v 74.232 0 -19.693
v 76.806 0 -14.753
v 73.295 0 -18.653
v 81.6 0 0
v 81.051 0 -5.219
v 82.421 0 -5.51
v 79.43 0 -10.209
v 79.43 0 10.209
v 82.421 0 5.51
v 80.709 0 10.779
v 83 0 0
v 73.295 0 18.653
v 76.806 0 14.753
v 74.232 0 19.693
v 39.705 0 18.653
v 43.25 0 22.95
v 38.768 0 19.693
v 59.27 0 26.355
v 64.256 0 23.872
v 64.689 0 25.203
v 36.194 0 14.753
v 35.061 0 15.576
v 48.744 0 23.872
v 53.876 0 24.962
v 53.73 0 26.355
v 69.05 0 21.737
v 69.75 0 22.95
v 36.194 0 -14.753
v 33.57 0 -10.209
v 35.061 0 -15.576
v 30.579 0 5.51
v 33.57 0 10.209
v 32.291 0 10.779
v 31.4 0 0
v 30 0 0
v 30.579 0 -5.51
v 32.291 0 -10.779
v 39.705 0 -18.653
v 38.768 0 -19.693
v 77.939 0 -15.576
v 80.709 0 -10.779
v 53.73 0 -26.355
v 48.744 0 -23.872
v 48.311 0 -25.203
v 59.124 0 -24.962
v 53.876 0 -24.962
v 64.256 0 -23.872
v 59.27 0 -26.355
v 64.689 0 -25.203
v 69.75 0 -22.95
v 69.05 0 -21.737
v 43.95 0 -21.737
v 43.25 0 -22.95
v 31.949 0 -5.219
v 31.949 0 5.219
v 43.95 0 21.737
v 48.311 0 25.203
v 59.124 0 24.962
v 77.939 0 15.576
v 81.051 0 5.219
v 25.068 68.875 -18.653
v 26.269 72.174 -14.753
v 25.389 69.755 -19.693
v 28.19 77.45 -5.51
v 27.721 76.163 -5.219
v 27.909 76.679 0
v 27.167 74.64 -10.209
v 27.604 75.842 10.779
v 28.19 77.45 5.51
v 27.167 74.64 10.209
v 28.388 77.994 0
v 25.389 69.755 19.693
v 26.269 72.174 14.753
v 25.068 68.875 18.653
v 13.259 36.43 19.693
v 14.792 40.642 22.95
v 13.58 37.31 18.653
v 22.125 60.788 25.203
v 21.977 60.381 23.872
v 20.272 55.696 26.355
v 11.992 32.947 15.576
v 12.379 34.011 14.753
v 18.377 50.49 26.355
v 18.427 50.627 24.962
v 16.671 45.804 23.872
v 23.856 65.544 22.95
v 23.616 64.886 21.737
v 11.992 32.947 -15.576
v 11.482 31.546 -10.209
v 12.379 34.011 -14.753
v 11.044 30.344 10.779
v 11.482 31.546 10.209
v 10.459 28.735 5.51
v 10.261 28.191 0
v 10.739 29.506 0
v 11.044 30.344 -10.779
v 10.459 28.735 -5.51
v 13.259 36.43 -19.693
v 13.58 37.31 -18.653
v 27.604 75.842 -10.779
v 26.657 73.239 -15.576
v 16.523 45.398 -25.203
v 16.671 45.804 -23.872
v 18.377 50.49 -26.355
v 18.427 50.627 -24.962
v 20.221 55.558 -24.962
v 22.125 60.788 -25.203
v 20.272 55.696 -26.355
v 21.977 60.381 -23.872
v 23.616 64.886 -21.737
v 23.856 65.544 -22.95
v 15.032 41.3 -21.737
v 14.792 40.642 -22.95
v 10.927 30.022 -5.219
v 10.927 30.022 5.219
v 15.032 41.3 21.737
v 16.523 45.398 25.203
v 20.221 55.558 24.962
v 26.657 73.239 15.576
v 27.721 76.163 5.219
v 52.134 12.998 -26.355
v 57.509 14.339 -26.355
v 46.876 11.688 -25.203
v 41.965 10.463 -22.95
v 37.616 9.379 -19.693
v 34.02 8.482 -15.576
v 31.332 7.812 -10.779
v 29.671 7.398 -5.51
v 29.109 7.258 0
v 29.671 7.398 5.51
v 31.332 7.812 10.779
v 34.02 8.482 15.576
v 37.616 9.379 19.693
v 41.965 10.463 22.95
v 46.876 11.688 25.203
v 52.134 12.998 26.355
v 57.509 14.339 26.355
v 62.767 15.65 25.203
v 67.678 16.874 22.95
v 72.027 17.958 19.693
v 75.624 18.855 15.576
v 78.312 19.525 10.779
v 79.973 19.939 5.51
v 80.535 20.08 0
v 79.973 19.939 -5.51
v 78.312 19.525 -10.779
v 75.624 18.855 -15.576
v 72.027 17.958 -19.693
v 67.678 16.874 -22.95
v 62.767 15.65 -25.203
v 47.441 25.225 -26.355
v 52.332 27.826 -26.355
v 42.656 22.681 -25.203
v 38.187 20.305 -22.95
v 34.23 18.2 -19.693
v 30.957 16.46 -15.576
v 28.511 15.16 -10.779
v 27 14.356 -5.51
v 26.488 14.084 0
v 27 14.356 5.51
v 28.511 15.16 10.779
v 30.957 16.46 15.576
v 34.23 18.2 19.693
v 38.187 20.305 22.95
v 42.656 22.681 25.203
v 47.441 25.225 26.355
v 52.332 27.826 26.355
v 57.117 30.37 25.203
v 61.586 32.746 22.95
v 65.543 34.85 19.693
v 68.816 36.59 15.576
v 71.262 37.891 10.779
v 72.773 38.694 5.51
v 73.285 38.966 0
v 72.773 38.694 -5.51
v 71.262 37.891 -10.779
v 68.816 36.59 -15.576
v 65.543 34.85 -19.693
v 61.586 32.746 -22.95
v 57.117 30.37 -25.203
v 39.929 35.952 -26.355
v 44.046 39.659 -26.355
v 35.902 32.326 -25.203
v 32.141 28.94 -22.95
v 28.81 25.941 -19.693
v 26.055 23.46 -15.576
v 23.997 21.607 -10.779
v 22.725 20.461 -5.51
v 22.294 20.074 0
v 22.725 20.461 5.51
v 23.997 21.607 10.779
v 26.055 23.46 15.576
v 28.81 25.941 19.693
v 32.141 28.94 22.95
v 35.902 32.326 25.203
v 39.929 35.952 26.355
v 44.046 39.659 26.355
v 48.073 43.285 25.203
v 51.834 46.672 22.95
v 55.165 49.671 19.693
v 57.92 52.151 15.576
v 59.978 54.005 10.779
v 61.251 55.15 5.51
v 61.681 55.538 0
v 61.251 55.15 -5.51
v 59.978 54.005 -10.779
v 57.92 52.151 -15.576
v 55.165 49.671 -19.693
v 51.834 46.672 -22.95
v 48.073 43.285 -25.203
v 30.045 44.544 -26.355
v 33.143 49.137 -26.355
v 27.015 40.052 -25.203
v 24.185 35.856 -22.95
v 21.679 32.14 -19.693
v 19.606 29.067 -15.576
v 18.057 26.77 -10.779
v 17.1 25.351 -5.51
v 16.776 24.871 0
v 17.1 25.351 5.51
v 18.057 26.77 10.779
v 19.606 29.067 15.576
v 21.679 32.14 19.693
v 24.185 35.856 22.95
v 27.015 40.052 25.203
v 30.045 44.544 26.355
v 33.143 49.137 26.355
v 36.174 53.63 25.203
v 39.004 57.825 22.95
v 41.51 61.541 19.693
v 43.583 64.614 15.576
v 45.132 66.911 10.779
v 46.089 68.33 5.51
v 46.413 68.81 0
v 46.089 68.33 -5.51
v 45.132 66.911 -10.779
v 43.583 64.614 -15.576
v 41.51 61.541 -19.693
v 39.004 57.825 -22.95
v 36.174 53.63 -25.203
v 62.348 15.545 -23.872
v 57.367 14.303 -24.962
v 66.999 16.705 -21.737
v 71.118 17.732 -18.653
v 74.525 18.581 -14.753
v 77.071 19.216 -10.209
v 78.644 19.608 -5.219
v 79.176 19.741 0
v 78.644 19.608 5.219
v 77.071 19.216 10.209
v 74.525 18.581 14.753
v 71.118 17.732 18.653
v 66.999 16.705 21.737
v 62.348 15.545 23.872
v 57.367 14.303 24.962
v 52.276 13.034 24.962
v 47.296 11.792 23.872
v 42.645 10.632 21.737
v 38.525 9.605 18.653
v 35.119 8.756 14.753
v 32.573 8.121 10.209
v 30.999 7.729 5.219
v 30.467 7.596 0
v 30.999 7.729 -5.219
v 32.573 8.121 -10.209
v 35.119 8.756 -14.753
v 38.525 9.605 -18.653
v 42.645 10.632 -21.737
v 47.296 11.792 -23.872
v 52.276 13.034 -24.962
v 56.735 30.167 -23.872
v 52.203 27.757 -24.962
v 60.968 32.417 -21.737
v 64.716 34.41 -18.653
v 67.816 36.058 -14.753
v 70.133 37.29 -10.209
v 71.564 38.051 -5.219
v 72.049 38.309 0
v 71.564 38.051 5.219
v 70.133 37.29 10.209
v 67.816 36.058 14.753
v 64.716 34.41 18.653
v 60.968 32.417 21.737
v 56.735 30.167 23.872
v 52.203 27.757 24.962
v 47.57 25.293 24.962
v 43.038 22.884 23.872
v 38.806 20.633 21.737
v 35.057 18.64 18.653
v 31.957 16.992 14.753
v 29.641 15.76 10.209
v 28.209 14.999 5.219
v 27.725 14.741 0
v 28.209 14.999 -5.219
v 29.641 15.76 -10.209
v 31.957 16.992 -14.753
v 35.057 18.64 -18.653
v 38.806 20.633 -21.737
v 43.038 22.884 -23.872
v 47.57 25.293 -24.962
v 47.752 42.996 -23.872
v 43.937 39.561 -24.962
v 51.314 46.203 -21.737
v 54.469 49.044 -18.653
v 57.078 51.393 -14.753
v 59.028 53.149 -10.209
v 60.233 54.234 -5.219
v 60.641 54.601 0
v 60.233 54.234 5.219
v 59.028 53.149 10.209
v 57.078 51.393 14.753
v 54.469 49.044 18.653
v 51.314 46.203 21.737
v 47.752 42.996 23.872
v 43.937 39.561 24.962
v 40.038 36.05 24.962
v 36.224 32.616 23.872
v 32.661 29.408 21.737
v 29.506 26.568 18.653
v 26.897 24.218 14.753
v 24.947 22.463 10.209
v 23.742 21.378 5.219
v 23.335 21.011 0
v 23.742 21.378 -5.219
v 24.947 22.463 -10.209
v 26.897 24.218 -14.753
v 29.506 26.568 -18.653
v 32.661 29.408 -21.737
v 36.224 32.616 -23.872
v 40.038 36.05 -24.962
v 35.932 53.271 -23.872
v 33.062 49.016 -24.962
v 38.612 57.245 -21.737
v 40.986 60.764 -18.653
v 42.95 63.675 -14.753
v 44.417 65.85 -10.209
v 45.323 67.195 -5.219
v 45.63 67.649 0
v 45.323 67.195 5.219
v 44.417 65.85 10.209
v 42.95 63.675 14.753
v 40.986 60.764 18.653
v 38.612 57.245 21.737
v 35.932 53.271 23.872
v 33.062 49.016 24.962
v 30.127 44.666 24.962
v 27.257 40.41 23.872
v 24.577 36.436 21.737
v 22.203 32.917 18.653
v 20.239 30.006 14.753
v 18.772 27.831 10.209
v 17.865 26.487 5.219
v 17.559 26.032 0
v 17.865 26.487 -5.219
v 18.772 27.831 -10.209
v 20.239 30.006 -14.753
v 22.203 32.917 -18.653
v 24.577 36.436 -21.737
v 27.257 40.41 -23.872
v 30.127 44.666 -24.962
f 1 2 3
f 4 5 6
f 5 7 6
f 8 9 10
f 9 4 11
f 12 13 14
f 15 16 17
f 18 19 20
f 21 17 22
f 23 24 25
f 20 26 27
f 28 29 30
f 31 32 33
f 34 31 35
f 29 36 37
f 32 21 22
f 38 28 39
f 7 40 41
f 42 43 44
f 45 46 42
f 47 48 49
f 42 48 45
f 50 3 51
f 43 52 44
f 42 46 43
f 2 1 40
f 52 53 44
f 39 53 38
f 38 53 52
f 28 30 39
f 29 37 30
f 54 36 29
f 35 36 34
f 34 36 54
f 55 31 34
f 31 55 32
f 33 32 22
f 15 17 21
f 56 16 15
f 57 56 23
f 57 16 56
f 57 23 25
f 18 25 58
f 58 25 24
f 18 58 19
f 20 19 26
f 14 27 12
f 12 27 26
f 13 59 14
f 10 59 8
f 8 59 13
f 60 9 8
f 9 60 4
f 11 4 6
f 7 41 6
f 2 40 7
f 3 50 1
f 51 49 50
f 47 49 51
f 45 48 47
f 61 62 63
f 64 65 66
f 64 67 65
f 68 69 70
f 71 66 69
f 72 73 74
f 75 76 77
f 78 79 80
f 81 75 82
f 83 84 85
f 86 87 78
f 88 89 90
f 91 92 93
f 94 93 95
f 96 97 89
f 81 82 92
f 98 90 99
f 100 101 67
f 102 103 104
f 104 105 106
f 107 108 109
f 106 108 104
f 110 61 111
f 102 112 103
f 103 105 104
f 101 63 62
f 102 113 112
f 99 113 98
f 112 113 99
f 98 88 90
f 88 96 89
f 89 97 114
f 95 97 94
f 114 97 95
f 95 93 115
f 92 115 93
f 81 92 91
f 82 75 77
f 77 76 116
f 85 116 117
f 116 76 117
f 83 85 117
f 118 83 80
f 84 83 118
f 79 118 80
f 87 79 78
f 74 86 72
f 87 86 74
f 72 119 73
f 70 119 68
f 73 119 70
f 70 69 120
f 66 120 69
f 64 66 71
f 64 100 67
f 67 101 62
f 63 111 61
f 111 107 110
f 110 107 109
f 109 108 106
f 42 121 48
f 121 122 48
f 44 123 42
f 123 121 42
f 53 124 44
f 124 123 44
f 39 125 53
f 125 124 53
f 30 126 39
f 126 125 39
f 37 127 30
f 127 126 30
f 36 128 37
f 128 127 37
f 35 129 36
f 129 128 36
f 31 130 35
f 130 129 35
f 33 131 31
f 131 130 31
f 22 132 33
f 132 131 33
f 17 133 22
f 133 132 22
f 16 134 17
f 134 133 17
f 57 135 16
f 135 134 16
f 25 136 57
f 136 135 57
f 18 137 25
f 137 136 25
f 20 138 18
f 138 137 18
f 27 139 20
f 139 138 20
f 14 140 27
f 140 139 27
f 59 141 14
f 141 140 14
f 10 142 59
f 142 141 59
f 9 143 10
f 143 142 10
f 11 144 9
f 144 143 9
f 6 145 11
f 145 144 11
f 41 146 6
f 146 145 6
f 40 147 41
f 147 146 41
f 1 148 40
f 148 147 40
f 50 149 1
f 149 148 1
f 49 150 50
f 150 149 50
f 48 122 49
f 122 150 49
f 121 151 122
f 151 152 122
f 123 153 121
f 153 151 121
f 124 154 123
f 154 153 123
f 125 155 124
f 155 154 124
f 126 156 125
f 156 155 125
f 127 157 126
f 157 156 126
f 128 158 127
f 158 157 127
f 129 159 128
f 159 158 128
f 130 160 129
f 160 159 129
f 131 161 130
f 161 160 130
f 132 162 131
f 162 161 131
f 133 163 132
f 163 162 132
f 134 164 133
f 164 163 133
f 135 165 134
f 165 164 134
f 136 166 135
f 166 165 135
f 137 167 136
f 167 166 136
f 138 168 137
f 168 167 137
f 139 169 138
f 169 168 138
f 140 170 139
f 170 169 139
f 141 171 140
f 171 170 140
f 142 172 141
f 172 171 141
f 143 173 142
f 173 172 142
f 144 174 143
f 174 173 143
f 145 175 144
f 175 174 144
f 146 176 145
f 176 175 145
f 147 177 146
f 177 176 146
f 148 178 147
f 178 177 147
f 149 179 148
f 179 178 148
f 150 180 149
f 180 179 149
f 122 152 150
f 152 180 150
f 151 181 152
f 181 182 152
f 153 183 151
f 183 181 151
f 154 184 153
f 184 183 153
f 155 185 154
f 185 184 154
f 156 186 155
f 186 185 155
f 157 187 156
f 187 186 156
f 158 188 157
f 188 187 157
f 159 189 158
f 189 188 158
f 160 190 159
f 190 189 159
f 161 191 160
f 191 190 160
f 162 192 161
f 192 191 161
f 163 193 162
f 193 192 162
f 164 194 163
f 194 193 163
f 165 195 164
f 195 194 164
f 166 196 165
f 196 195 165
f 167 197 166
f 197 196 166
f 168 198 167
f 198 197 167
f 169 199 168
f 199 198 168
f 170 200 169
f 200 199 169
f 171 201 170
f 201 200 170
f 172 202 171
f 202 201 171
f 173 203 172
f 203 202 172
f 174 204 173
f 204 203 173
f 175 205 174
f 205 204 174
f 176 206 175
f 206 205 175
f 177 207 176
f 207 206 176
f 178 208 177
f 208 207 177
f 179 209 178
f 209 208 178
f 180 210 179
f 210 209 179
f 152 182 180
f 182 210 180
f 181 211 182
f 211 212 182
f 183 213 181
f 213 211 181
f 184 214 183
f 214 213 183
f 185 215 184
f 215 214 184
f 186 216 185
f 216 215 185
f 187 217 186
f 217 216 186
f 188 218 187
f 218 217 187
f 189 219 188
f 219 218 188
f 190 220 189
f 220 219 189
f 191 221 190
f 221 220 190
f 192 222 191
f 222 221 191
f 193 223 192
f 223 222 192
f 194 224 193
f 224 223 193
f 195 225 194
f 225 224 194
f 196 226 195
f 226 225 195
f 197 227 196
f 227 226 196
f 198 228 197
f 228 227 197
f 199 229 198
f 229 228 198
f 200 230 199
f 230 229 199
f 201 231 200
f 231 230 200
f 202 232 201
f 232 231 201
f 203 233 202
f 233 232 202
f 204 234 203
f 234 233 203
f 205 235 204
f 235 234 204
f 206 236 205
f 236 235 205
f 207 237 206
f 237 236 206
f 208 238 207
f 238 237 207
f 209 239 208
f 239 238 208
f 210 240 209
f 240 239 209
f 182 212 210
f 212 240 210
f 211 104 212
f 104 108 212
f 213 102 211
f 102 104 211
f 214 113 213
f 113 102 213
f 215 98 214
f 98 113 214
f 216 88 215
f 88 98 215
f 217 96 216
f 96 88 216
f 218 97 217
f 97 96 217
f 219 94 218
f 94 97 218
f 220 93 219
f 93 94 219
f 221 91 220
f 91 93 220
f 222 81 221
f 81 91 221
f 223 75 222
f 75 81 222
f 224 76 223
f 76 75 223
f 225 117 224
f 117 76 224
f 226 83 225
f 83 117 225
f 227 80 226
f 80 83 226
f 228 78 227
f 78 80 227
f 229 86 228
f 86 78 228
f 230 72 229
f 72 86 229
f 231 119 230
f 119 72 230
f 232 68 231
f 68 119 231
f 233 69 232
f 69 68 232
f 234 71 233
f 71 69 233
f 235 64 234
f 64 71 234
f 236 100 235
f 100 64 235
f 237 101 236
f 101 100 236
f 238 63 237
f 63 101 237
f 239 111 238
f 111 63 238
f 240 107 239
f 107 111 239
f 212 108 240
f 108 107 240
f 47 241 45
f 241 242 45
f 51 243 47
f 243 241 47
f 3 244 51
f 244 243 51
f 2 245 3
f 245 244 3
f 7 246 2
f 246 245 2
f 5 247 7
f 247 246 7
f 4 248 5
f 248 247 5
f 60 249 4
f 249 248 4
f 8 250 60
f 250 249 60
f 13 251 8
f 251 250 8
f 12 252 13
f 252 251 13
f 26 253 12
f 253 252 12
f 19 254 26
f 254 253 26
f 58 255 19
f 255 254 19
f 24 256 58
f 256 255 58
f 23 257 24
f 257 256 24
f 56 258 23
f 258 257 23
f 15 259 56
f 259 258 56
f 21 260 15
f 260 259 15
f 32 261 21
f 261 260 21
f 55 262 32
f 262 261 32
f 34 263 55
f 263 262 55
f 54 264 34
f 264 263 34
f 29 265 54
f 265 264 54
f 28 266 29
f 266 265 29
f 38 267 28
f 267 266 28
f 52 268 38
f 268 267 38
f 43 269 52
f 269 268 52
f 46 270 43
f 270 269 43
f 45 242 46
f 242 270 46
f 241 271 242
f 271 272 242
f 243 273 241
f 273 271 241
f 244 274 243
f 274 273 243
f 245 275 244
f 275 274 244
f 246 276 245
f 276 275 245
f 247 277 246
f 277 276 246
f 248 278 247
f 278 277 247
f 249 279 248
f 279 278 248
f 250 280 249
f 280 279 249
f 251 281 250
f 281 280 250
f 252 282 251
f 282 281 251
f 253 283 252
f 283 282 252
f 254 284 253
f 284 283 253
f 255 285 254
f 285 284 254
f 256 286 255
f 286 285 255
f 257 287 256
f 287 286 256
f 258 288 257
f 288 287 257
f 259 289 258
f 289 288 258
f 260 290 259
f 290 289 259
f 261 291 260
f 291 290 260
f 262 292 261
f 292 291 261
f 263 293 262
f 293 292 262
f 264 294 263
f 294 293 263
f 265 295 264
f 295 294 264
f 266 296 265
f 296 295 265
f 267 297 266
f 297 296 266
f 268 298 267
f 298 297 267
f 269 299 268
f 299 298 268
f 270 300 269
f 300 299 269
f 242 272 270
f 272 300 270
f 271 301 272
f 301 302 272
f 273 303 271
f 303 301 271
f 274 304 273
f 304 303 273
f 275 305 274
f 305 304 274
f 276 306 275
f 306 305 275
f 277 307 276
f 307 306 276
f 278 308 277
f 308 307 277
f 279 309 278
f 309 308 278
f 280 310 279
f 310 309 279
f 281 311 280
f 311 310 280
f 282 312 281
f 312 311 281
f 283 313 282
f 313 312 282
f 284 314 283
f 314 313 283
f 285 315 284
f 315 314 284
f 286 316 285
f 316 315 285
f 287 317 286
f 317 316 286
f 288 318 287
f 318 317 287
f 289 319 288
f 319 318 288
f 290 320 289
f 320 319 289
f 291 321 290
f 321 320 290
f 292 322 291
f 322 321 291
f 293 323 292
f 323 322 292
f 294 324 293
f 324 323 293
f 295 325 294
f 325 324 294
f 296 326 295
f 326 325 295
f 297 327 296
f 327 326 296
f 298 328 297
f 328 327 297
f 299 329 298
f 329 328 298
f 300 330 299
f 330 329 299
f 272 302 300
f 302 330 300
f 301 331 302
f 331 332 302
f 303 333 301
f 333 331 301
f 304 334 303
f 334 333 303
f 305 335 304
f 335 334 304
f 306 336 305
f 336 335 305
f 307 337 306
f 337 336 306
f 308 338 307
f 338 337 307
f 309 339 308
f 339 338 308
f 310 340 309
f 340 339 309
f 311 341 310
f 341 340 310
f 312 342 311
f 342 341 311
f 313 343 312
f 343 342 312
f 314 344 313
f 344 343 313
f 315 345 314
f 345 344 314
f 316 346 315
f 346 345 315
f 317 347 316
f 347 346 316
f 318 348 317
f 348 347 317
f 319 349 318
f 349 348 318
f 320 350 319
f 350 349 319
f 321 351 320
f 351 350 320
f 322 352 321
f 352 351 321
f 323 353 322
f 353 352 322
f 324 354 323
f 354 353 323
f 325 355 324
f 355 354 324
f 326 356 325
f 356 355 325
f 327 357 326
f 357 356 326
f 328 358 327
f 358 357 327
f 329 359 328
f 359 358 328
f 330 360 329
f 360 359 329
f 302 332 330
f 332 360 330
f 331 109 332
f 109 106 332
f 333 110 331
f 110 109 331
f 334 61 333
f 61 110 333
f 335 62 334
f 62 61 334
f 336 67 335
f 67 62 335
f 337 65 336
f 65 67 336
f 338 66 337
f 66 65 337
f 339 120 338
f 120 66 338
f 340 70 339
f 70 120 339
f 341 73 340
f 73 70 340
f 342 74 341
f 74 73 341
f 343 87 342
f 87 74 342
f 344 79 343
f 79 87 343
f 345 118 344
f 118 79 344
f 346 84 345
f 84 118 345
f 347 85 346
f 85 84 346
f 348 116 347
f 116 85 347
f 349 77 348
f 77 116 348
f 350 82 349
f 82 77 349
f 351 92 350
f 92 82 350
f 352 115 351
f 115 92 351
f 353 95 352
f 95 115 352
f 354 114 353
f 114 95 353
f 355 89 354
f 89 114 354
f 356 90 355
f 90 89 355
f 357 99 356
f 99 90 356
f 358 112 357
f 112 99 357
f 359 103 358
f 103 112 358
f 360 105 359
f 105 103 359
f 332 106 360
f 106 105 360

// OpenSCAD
module slide_elbow(
    degrees = 90,
    thickness = 1,
    tube_r,
    elbow_r
) {
    rotate_extrude(angle=degrees){
        // rotate(90, [1,0,0])
        translate([(tube_r + thickness + elbow_r),0,0])
        difference() {
            circle(r = tube_r + thickness);
            circle(r = tube_r);
        }
    }
}


slide_elbow(
    degrees = 70,
    thickness = 1.4,
    tube_r = 25.1,
    elbow_r = 30 
);
